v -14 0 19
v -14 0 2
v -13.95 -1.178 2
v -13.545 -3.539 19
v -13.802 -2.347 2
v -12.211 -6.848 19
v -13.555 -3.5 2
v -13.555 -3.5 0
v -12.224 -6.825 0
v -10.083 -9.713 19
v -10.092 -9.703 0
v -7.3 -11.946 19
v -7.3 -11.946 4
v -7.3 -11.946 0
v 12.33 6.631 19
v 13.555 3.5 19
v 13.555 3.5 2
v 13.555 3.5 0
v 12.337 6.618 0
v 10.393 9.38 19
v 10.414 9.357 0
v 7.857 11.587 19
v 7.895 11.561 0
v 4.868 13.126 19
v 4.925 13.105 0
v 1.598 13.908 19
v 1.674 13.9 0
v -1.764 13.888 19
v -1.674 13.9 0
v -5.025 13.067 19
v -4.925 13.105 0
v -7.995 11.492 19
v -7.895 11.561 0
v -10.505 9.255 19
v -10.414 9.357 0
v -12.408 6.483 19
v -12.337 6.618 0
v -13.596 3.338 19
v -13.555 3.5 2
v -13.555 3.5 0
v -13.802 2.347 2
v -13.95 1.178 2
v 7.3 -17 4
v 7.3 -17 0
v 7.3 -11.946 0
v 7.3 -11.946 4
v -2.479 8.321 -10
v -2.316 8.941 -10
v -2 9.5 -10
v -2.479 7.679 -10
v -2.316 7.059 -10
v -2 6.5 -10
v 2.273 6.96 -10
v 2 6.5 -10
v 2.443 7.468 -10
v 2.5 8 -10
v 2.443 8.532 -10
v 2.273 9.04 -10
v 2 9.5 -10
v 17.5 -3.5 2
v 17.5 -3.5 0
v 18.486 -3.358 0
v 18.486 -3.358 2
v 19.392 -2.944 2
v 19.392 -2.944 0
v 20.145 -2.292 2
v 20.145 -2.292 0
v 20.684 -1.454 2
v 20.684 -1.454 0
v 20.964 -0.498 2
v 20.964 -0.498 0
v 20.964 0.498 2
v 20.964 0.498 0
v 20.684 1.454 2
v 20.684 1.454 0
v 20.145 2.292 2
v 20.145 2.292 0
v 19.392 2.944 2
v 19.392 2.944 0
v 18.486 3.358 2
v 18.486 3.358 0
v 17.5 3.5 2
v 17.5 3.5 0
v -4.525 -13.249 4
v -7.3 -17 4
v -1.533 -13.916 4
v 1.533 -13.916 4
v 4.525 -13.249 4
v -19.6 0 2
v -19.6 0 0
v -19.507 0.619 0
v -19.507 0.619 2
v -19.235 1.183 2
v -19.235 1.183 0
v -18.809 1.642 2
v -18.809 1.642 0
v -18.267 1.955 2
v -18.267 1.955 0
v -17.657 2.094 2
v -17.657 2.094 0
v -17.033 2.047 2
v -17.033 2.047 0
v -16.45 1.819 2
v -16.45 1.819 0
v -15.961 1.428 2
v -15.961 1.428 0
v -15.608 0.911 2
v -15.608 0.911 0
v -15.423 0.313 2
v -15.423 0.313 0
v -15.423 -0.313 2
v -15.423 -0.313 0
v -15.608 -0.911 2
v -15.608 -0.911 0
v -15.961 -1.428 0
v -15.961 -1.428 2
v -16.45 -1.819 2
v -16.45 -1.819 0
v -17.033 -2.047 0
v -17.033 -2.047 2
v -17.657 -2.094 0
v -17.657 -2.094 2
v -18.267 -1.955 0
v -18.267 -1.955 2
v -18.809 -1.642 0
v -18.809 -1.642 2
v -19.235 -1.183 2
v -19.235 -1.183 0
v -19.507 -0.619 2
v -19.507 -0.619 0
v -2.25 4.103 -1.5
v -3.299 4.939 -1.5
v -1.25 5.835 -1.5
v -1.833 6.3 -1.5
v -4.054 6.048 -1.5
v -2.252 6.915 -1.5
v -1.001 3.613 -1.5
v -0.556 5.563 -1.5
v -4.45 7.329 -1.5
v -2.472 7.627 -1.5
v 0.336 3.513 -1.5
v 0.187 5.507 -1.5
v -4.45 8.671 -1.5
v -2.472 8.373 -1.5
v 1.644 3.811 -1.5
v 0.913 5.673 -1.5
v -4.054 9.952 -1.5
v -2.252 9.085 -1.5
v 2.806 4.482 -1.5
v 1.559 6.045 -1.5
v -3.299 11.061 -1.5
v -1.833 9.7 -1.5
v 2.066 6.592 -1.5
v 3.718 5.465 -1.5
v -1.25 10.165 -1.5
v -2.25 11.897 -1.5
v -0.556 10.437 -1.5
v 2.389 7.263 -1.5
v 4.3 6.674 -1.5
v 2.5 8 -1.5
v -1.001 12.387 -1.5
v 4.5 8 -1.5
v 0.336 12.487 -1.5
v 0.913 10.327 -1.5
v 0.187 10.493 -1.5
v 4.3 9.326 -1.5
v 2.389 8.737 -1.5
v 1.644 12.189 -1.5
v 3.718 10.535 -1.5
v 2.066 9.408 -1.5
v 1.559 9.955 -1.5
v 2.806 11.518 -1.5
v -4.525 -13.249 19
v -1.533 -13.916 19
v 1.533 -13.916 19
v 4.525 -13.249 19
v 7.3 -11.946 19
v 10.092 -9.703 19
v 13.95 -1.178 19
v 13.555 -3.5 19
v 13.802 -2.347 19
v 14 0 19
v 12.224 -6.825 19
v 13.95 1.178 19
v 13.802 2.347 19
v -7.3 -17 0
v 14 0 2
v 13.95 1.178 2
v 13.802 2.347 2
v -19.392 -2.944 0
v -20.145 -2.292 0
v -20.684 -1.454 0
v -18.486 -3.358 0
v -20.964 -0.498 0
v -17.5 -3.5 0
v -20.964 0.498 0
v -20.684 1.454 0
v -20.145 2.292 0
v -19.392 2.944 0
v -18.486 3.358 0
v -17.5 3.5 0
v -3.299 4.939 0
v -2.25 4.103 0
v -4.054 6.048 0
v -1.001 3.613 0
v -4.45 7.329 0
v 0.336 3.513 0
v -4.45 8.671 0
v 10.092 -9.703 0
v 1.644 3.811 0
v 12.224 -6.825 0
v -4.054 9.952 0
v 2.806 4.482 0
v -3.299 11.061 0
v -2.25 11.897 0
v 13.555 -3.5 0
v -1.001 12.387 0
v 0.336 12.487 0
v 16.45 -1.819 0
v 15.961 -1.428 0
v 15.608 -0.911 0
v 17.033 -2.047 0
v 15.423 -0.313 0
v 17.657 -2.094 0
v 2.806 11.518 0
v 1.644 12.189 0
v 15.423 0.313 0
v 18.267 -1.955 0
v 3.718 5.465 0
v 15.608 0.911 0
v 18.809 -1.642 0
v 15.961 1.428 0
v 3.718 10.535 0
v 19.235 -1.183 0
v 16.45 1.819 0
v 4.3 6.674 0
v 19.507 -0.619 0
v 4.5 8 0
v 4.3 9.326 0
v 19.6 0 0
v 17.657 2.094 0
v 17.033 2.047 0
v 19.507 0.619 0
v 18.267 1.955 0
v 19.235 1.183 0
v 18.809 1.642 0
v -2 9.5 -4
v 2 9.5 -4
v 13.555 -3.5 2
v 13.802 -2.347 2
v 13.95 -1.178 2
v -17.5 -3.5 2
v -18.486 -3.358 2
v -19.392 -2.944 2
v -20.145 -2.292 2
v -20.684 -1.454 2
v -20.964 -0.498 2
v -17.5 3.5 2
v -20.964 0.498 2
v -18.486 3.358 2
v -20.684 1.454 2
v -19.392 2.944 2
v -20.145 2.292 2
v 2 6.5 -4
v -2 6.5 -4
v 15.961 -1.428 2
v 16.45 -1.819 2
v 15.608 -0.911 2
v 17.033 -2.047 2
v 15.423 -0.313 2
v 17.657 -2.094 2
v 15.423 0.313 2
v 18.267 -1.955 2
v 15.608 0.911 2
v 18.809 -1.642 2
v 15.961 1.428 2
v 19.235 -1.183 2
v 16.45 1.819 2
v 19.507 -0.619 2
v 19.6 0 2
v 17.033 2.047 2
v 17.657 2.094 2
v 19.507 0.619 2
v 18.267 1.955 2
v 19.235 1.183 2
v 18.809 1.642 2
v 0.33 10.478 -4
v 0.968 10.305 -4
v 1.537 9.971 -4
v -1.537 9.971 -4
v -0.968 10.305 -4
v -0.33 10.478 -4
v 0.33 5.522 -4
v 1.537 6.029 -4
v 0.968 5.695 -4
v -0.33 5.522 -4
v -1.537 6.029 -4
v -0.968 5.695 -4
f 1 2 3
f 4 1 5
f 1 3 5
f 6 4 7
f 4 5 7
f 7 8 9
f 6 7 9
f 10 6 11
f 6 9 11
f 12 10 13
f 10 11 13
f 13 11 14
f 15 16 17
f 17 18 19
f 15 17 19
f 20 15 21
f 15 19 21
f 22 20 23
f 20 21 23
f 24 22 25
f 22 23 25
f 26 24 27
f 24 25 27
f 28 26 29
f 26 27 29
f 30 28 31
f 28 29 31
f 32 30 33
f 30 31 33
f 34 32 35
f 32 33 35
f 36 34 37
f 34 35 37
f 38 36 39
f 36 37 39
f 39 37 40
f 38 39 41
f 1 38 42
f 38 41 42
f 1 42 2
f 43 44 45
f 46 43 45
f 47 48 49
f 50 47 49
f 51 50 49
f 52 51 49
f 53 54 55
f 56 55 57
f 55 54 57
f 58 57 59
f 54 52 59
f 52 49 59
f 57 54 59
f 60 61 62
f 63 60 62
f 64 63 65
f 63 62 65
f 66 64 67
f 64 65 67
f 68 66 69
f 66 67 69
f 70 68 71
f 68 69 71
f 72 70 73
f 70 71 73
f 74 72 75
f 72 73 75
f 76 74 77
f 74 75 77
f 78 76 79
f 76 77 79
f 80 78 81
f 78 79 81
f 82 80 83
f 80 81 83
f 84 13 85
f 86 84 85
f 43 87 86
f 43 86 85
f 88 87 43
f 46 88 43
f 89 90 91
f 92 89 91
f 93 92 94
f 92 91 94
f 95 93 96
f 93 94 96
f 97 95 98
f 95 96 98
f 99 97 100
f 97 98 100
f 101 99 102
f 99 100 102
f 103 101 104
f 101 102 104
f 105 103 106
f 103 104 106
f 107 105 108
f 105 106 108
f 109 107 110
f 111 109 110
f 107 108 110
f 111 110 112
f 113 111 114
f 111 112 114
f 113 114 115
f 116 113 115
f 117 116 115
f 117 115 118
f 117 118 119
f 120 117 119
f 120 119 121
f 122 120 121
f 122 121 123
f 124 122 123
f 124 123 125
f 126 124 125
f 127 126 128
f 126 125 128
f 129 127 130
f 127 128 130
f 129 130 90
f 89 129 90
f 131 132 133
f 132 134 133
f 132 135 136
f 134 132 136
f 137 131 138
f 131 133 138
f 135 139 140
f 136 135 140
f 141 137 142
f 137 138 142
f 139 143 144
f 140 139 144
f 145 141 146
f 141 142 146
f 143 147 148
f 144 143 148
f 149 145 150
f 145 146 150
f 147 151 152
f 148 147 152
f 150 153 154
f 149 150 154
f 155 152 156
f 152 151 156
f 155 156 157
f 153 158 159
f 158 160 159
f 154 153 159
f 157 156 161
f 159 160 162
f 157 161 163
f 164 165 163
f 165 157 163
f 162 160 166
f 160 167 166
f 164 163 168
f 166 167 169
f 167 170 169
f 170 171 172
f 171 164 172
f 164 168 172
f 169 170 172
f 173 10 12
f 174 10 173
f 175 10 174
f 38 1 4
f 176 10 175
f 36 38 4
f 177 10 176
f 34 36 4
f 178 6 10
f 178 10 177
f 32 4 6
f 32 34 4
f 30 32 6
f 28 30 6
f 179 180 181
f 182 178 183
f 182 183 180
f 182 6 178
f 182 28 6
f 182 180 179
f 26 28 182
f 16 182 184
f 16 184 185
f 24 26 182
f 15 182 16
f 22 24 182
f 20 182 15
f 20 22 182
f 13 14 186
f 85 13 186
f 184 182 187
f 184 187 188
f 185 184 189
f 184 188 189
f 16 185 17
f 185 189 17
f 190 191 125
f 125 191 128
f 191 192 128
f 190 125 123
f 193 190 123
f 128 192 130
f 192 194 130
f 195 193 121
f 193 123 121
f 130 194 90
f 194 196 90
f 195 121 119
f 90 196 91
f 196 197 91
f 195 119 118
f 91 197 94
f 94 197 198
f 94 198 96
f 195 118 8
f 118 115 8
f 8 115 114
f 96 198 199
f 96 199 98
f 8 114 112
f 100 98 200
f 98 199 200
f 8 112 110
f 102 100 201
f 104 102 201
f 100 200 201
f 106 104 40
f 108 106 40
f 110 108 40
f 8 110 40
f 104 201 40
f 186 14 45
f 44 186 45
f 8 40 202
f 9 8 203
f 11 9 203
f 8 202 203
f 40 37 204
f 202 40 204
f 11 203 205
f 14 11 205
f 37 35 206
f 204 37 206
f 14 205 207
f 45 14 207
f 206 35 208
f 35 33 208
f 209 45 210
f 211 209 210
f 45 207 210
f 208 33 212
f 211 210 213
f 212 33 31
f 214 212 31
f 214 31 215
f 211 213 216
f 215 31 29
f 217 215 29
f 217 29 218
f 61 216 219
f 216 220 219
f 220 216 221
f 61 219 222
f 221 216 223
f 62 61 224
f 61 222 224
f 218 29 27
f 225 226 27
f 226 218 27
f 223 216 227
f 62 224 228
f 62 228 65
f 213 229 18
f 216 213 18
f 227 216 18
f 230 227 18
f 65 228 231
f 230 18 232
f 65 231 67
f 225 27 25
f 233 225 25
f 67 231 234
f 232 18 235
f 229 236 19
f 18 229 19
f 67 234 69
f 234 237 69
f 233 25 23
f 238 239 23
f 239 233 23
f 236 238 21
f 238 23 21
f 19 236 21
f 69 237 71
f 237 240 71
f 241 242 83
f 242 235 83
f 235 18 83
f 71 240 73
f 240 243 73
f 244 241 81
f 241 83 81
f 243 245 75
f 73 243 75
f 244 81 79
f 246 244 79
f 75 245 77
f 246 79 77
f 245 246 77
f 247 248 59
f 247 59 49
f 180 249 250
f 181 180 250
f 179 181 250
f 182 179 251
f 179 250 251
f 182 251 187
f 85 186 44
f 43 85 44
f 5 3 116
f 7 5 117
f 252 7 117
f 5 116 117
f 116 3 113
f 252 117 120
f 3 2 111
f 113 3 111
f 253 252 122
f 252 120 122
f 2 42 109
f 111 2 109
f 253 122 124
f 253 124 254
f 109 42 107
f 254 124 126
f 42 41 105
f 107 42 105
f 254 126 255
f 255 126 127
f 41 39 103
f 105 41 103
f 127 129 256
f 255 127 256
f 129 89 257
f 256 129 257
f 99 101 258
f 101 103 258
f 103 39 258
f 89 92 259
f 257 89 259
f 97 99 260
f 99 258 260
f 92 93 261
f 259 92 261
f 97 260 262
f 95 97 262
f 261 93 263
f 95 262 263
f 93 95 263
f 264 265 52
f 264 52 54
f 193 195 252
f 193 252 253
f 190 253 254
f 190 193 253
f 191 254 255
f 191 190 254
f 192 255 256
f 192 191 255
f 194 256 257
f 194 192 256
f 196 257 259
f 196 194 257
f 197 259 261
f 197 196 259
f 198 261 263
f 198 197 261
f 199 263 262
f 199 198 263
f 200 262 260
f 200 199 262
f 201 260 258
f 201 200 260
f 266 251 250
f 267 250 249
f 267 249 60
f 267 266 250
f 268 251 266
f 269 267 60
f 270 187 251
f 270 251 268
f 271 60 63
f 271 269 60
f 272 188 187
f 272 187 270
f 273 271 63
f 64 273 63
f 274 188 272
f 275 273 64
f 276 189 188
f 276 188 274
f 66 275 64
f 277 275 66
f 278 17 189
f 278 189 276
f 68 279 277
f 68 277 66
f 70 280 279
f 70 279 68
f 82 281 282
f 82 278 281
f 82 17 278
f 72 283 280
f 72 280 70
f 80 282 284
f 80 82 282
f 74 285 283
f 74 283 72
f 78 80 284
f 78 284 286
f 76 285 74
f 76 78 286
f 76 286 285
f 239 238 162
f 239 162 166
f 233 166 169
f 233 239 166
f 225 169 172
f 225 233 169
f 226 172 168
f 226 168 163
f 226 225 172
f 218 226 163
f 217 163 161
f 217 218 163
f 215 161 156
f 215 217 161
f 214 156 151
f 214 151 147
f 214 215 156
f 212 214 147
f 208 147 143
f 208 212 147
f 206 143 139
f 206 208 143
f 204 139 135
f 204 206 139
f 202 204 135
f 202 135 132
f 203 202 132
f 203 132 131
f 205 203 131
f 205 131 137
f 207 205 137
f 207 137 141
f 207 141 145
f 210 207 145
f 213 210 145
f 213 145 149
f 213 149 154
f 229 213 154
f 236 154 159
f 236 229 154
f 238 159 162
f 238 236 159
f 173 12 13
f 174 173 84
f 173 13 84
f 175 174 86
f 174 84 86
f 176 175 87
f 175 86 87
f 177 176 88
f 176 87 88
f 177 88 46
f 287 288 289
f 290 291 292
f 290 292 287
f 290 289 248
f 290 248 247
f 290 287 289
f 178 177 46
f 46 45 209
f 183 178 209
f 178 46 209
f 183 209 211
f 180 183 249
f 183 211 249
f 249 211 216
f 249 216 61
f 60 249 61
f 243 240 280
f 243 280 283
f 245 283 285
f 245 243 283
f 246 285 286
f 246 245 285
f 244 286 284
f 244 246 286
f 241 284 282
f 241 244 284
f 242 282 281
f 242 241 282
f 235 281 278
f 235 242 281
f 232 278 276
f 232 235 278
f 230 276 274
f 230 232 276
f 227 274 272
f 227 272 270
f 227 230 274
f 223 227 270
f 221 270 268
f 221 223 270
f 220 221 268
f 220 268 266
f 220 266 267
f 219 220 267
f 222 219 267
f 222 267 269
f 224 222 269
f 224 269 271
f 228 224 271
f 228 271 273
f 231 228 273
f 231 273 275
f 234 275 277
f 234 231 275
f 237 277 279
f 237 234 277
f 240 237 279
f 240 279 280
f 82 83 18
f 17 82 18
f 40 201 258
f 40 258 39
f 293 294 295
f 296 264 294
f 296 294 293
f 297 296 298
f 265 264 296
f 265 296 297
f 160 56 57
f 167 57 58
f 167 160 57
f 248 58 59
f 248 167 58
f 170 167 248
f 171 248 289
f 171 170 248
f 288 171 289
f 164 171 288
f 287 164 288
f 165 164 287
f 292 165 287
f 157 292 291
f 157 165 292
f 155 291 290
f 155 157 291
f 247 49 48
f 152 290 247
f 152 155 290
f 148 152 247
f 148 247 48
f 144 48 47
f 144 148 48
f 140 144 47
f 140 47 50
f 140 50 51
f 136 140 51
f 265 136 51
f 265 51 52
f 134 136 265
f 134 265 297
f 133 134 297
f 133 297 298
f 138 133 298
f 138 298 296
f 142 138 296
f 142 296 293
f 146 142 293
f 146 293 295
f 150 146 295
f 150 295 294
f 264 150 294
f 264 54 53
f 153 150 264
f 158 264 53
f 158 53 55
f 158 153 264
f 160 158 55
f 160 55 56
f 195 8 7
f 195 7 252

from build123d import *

# Parameters (mm, degrees)
SKETCH2_R           = 14
BOSS_EXTRUDE1_DEPTH = 19
SKETCH2_3_R         = 2.1
BOSS_EXTRUDE2_DEPTH = 2
BOSS_EXTRUDE3_DEPTH = 4
SKETCH3_R           = 4.5
BOSS_EXTRUDE4_DEPTH = 1.5
SKETCH5_R           = 2.5
BOSS_EXTRUDE5_DEPTH = 10
CUT_EXTRUDE1_START  = -6
CUT_EXTRUDE1_DEPTH  = 6


with BuildPart() as part:
    # Sketch2 → Boss-Extrude1 (new body)
    with BuildSketch(Plane.XY):
        Circle(SKETCH2_R)
    extrude(amount=BOSS_EXTRUDE1_DEPTH)

    # Sketch2<3> → Boss-Extrude2 (add)
    with BuildSketch(Plane.XY):
        with BuildLine():
            ThreePointArc((17.5, -3.5), (21, 0), (17.5, 3.5))
            Line((17.5, 3.5), (13.555441712, 3.5))
            ThreePointArc((13.555441712, 3.5), (13.888415748, 1.764060095), (14, 0))
            ThreePointArc((14, 0), (13.888415748, -1.764060095), (13.555441712, -3.5))
            Line((13.555441712, -3.5), (17.5, -3.5))
        make_face()
        with Locations((17.5, 0)):
            Circle(SKETCH2_3_R, mode=Mode.SUBTRACT)
    boss_extrude2 = extrude(amount=BOSS_EXTRUDE2_DEPTH)

    # Mirror1: Boss-Extrude2 across plane
    add(boss_extrude2.mirror(Plane(origin=(0, 0, 0), x_dir=(0, 0, 1), z_dir=(1, 0, 0))))

    # Sketch2<4> → Boss-Extrude3 (add)
    with BuildSketch(Plane.XY):
        with BuildLine():
            ThreePointArc((7.3, -11.94612908), (0, -14), (-7.3, -11.94612908))
            Line((-7.3, -11.94612908), (-7.3, -17))
            Line((-7.3, -17), (7.3, -17))
            Line((7.3, -17), (7.3, -11.94612908))
        make_face()
    extrude(amount=BOSS_EXTRUDE3_DEPTH)

    # Sketch3 → Boss-Extrude4 (add)
    with BuildSketch(Plane.XY):
        with Locations((0, 8)):
            Circle(SKETCH3_R)
    extrude(amount=-BOSS_EXTRUDE4_DEPTH)

    # Sketch5 → Boss-Extrude5 (add)
    with BuildSketch(Plane.XY):
        with Locations((0, 8)):
            Circle(SKETCH5_R)
    extrude(amount=-BOSS_EXTRUDE5_DEPTH)

    # Sketch7 → Cut-Extrude1 (cut)
    with BuildSketch(Plane(origin=(0, 0, -10), x_dir=(-1, 0, 0), z_dir=(0, 0, -1)).offset(CUT_EXTRUDE1_START)):
        with BuildLine():
            ThreePointArc((-2, 6.5), (0, 5.5), (2, 6.5))
            Line((2, 6.5), (-2, 6.5))
        make_face()
        with BuildLine():
            ThreePointArc((2, 9.5), (0, 10.5), (-2, 9.5))
            Line((-2, 9.5), (2, 9.5))
        make_face()
    extrude(amount=CUT_EXTRUDE1_DEPTH, mode=Mode.SUBTRACT)


solid = part.part
